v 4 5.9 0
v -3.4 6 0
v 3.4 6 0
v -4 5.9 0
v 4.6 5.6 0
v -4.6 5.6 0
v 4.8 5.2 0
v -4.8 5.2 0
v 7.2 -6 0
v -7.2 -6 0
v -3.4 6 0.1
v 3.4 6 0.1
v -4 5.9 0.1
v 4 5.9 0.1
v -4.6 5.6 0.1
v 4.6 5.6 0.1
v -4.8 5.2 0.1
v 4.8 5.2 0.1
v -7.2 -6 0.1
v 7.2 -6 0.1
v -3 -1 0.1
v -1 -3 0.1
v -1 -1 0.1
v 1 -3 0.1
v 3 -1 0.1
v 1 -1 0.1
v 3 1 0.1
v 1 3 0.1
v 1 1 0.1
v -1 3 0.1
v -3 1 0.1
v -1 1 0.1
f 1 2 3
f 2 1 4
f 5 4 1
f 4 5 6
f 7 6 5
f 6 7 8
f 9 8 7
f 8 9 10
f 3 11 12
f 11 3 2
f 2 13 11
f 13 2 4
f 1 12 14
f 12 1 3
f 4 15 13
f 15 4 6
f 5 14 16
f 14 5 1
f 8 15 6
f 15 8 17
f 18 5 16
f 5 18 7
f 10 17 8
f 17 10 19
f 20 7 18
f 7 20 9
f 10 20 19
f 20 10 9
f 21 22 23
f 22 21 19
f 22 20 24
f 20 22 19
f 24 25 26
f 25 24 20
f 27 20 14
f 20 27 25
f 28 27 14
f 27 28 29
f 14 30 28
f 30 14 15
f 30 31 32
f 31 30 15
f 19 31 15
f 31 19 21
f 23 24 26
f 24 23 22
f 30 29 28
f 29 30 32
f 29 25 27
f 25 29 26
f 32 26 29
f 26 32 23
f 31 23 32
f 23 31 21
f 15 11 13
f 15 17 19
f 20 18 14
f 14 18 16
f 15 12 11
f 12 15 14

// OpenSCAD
// file: s/004315s01.scad
use <../../lib.scad>
function ldraw_lib__s__004315s01() = [
// 0 ~Sticker for Minifig Torso without Top Surface
// 0 Name: s\004315s01.dat
// 0 Author: Michael Heidemann [mikeheide]
// 0 !LDRAW_ORG Subpart UPDATE 2018-02
// 0 !LICENSE Licensed under CC BY 4.0 : see CAreadme.txt
// 
// 0 BFC CERTIFY CCW
  [0,"BFC","CERTIFY"],
  [0,"BFC","CCW"],
// 
// 0 !HISTORY 2011-12-29 [PTadmin] Official Update 2011-02
// 0 !HISTORY 2017-07-04 [cwdee] Add conditional lines in border
// 0 !HISTORY 2018-12-08 [PTadmin] Official Update 2018-02
// 
// 
// 0 // Back
// 
// 4 16 8.5 0 15 10 0 14.75 -10 0 14.75 -8.5 0 15
  [4,16,8.5,0,15,10,0,14.75,-10,0,14.75,-8.5,0,15],
// 4 16 10 0 14.75 11.5 0 14 -11.5 0 14 -10 0 14.75
  [4,16,10,0,14.75,11.5,0,14,-11.5,0,14,-10,0,14.75],
// 4 16 11.5 0 14 12 0 13 -12 0 13 -11.5 0 14
  [4,16,11.5,0,14,12,0,13,-12,0,13,-11.5,0,14],
// 4 16 12 0 13 18 0 -15 -18 0 -15 -12 0 13
  [4,16,12,0,13,18,0,-15,-18,0,-15,-12,0,13],
// 0 // Border
// 4 16 8.5 0 15 -8.5 0 15 -8.5 -0.25 15 8.5 -0.25 15
  [4,16,8.5,0,15,-8.5,0,15,-8.5,-0.25,15,8.5,-0.25,15],
// 4 16 -8.5 0 15 -10 0 14.75 -10 -0.25 14.75 -8.5 -0.25 15
  [4,16,-8.5,0,15,-10,0,14.75,-10,-0.25,14.75,-8.5,-0.25,15],
// 4 16 8.5 -0.25 15 10 -0.25 14.75 10 0 14.75 8.5 0 15
  [4,16,8.5,-0.25,15,10,-0.25,14.75,10,0,14.75,8.5,0,15],
// 4 16 -10 0 14.75 -11.5 0 14 -11.5 -0.25 14 -10 -0.25 14.75
  [4,16,-10,0,14.75,-11.5,0,14,-11.5,-0.25,14,-10,-0.25,14.75],
// 4 16 10 -0.25 14.75 11.5 -0.25 14 11.5 0 14 10 0 14.75
  [4,16,10,-0.25,14.75,11.5,-0.25,14,11.5,0,14,10,0,14.75],
// 4 16 -11.5 0 14 -12 0 13 -12 -0.25 13 -11.5 -0.25 14
  [4,16,-11.5,0,14,-12,0,13,-12,-0.25,13,-11.5,-0.25,14],
// 4 16 11.5 -0.25 14 12 -0.25 13 12 0 13 11.5 0 14
  [4,16,11.5,-0.25,14,12,-0.25,13,12,0,13,11.5,0,14],
// 4 16 -18 -0.25 -15 -12 -0.25 13 -12 0 13 -18 0 -15
  [4,16,-18,-0.25,-15,-12,-0.25,13,-12,0,13,-18,0,-15],
// 4 16 18 0 -15 12 0 13 12 -0.25 13 18 -0.25 -15
  [4,16,18,0,-15,12,0,13,12,-0.25,13,18,-0.25,-15],
// 4 16 -18 0 -15 18 0 -15 18 -0.25 -15 -18 -0.25 -15
  [4,16,-18,0,-15,18,0,-15,18,-0.25,-15,-18,-0.25,-15],
// 0 // Border conditional lines
// 5 24 8.5 0 15 8.5 -0.25 15 0 0 15 10 0 14.75
  [5,24,8.5,0,15,8.5,-0.25,15,0,0,15,10,0,14.75],
// 5 24 10 0 14.75 10 -0.25 14.75 8.5 0 15 11.5 0 14
  [5,24,10,0,14.75,10,-0.25,14.75,8.5,0,15,11.5,0,14],
// 5 24 11.5 0 14 11.5 -0.25 14 10 0 14.75 12 0 13
  [5,24,11.5,0,14,11.5,-0.25,14,10,0,14.75,12,0,13],
// 5 24 12 0 13 12 -0.25 13 11.5 0 14 18 0 -15
  [5,24,12,0,13,12,-0.25,13,11.5,0,14,18,0,-15],
// 5 24 -8.5 0 15 -8.5 -0.25 15 0 0 15 -10 0 14.75
  [5,24,-8.5,0,15,-8.5,-0.25,15,0,0,15,-10,0,14.75],
// 5 24 -10 0 14.75 -10 -0.25 14.75 -8.5 0 15 -11.5 0 14
  [5,24,-10,0,14.75,-10,-0.25,14.75,-8.5,0,15,-11.5,0,14],
// 5 24 -11.5 0 14 -11.5 -0.25 14 -10 0 14.75 -12 0 13
  [5,24,-11.5,0,14,-11.5,-0.25,14,-10,0,14.75,-12,0,13],
// 5 24 -12 0 13 -12 -0.25 13 -11.5 0 14 -18 0 -15
  [5,24,-12,0,13,-12,-0.25,13,-11.5,0,14,-18,0,-15],
];
module ldraw_lib__s__004315s01(step=0, col=false, unit=2/5, alt=false, line=0.2, solid=!$preview)
    makepoly(ldraw_lib__s__004315s01(), step=step, col=col, unit=unit, alt=alt, line=line, solid=solid);
ldraw_lib__s__004315s01(line=0.2);
// file: 004363a.scad
use <../lib.scad>
use <s/004315s01.scad>
function ldraw_lib__004363a() = [
// 0 Sticker Minifig Torso with Red Cross Logo
// 0 Name: 004363a.dat
// 0 Author: Takeshi Takahashi [RainbowDolphin]
// 0 !LDRAW_ORG Part UPDATE 2020-03
// 0 !LICENSE Licensed under CC BY 4.0 : see CAreadme.txt
// 
// 0 BFC CERTIFY CCW
  [0,"BFC","CERTIFY"],
  [0,"BFC","CCW"],
// 
// 0 !KEYWORDS Set 606, Set 623
// 
// 0 !HISTORY 2020-11-08 [RainbowDolphin] Created based on 004511b by J.C. Tchang [tchang]
// 0 !HISTORY 2020-12-29 [PTadmin] Official Update 2020-03
// 
// 
// 1 16 0 0 0 1 0 0 0 1 0 0 0 1 s\004315s01.dat
  [1,16,0,0,0,1,0,0,0,1,0,0,0,1, ldraw_lib__s__004315s01()],
// 4 15 -18 -.25 -15 -2.5 -.25 -7.5 -2.5 -.25 -2.5 -7.5 -.25 -2.5
  [4,15,-18,-.25,-15,-2.5,-.25,-7.5,-2.5,-.25,-2.5,-7.5,-.25,-2.5],
// 4 15 -18 -.25 -15 18 -.25 -15 2.5 -.25 -7.5 -2.5 -.25 -7.5
  [4,15,-18,-.25,-15,18,-.25,-15,2.5,-.25,-7.5,-2.5,-.25,-7.5],
// 4 15 18 -.25 -15 7.5 -.25 -2.5 2.5 -.25 -2.5 2.5 -.25 -7.5
  [4,15,18,-.25,-15,7.5,-.25,-2.5,2.5,-.25,-2.5,2.5,-.25,-7.5],
// 4 15 18 -.25 -15 10 -.25 14.75 7.5 -.25 2.5 7.5 -.25 -2.5
  [4,15,18,-.25,-15,10,-.25,14.75,7.5,-.25,2.5,7.5,-.25,-2.5],
// 4 15 10 -.25 14.75 2.5 -.25 7.5 2.5 -.25 2.5 7.5 -.25 2.5
  [4,15,10,-.25,14.75,2.5,-.25,7.5,2.5,-.25,2.5,7.5,-.25,2.5],
// 4 15 10 -.25 14.75 -11.5 -.25 14 -2.5 -.25 7.5 2.5 -.25 7.5
  [4,15,10,-.25,14.75,-11.5,-.25,14,-2.5,-.25,7.5,2.5,-.25,7.5],
// 4 15 -11.5 -.25 14 -7.5 -.25 2.5 -2.5 -.25 2.5 -2.5 -.25 7.5
  [4,15,-11.5,-.25,14,-7.5,-.25,2.5,-2.5,-.25,2.5,-2.5,-.25,7.5],
// 4 15 -18 -.25 -15 -7.5 -.25 -2.5 -7.5 -.25 2.5 -11.5 -.25 14
  [4,15,-18,-.25,-15,-7.5,-.25,-2.5,-7.5,-.25,2.5,-11.5,-.25,14],
// 4 4 -2.5 -0.25 -7.5 2.5 -0.25 -7.5 2.5 -0.25 -2.5 -2.5 -0.25 -2.5
  [4,4,-2.5,-0.25,-7.5,2.5,-0.25,-7.5,2.5,-0.25,-2.5,-2.5,-0.25,-2.5],
// 4 4 -2.5 -0.25 2.5 2.5 -0.25 2.5 2.5 -0.25 7.5 -2.5 -0.25 7.5
  [4,4,-2.5,-0.25,2.5,2.5,-0.25,2.5,2.5,-0.25,7.5,-2.5,-0.25,7.5],
// 4 4 7.5 -0.25 -2.5 7.5 -0.25 2.5 2.5 -0.25 2.5 2.5 -0.25 -2.5
  [4,4,7.5,-0.25,-2.5,7.5,-0.25,2.5,2.5,-0.25,2.5,2.5,-0.25,-2.5],
// 4 4 2.5 -0.25 -2.5 2.5 -0.25 2.5 -2.5 -0.25 2.5 -2.5 -0.25 -2.5
  [4,4,2.5,-0.25,-2.5,2.5,-0.25,2.5,-2.5,-0.25,2.5,-2.5,-0.25,-2.5],
// 4 4 -2.5 -0.25 -2.5 -2.5 -0.25 2.5 -7.5 -0.25 2.5 -7.5 -0.25 -2.5
  [4,4,-2.5,-0.25,-2.5,-2.5,-0.25,2.5,-7.5,-0.25,2.5,-7.5,-0.25,-2.5],
// 3 15 -11.5 -.25 14 -8.5 -.25 15 -10 -.25 14.75
  [3,15,-11.5,-.25,14,-8.5,-.25,15,-10,-.25,14.75],
// 3 15 -11.5 -.25 14 -12 -.25 13 -18 -.25 -15
  [3,15,-11.5,-.25,14,-12,-.25,13,-18,-.25,-15],
// 3 15 18 -.25 -15 12 -.25 13 10 -.25 14.75
  [3,15,18,-.25,-15,12,-.25,13,10,-.25,14.75],
// 3 15 10 -.25 14.75 12 -.25 13 11.5 -.25 14
  [3,15,10,-.25,14.75,12,-.25,13,11.5,-.25,14],
// 4 15 -8.5 -.25 15 -11.5 -.25 14 10 -.25 14.75 8.5 -.25 15
  [4,15,-8.5,-.25,15,-11.5,-.25,14,10,-.25,14.75,8.5,-.25,15],
];
module ldraw_lib__004363a(step=0, col=false, unit=2/5, alt=false, line=0.2, solid=!$preview)
    makepoly(ldraw_lib__004363a(), step=step, col=col, unit=unit, alt=alt, line=line, solid=solid);
ldraw_lib__004363a(line=0.2);
// main file
use <../lib.scad>
use <004363a.scad>
function ldraw_lib__004762b() = [
// 0 =Sticker Minifig Torso with Red Cross Logo
// 0 Name: 004762b.dat
// 0 Author: Takeshi Takahashi [RainbowDolphin]
// 0 !LDRAW_ORG Part Alias UPDATE 2024-07
// 0 !LICENSE Licensed under CC BY 4.0 : see CAreadme.txt
// 
// 0 BFC CERTIFY CCW
  [0,"BFC","CERTIFY"],
  [0,"BFC","CCW"],
// 
// 0 !KEYWORDS Medic Car, Set 623-1
// 
// 0 !HISTORY 2024-08-26 [OrionP] Official Update 2024-07
// 
// 1 16 0 0 0 1 0 0 0 1 0 0 0 1 004363a.dat
  [1,16,0,0,0,1,0,0,0,1,0,0,0,1, ldraw_lib__004363a()],
];
module ldraw_lib__004762b(step=0, col=false, unit=2/5, alt=false, line=0.2, solid=!$preview)
    makepoly(ldraw_lib__004762b(), step=step, col=col, unit=unit, alt=alt, line=line, solid=solid);
ldraw_lib__004762b(line=0.2);
